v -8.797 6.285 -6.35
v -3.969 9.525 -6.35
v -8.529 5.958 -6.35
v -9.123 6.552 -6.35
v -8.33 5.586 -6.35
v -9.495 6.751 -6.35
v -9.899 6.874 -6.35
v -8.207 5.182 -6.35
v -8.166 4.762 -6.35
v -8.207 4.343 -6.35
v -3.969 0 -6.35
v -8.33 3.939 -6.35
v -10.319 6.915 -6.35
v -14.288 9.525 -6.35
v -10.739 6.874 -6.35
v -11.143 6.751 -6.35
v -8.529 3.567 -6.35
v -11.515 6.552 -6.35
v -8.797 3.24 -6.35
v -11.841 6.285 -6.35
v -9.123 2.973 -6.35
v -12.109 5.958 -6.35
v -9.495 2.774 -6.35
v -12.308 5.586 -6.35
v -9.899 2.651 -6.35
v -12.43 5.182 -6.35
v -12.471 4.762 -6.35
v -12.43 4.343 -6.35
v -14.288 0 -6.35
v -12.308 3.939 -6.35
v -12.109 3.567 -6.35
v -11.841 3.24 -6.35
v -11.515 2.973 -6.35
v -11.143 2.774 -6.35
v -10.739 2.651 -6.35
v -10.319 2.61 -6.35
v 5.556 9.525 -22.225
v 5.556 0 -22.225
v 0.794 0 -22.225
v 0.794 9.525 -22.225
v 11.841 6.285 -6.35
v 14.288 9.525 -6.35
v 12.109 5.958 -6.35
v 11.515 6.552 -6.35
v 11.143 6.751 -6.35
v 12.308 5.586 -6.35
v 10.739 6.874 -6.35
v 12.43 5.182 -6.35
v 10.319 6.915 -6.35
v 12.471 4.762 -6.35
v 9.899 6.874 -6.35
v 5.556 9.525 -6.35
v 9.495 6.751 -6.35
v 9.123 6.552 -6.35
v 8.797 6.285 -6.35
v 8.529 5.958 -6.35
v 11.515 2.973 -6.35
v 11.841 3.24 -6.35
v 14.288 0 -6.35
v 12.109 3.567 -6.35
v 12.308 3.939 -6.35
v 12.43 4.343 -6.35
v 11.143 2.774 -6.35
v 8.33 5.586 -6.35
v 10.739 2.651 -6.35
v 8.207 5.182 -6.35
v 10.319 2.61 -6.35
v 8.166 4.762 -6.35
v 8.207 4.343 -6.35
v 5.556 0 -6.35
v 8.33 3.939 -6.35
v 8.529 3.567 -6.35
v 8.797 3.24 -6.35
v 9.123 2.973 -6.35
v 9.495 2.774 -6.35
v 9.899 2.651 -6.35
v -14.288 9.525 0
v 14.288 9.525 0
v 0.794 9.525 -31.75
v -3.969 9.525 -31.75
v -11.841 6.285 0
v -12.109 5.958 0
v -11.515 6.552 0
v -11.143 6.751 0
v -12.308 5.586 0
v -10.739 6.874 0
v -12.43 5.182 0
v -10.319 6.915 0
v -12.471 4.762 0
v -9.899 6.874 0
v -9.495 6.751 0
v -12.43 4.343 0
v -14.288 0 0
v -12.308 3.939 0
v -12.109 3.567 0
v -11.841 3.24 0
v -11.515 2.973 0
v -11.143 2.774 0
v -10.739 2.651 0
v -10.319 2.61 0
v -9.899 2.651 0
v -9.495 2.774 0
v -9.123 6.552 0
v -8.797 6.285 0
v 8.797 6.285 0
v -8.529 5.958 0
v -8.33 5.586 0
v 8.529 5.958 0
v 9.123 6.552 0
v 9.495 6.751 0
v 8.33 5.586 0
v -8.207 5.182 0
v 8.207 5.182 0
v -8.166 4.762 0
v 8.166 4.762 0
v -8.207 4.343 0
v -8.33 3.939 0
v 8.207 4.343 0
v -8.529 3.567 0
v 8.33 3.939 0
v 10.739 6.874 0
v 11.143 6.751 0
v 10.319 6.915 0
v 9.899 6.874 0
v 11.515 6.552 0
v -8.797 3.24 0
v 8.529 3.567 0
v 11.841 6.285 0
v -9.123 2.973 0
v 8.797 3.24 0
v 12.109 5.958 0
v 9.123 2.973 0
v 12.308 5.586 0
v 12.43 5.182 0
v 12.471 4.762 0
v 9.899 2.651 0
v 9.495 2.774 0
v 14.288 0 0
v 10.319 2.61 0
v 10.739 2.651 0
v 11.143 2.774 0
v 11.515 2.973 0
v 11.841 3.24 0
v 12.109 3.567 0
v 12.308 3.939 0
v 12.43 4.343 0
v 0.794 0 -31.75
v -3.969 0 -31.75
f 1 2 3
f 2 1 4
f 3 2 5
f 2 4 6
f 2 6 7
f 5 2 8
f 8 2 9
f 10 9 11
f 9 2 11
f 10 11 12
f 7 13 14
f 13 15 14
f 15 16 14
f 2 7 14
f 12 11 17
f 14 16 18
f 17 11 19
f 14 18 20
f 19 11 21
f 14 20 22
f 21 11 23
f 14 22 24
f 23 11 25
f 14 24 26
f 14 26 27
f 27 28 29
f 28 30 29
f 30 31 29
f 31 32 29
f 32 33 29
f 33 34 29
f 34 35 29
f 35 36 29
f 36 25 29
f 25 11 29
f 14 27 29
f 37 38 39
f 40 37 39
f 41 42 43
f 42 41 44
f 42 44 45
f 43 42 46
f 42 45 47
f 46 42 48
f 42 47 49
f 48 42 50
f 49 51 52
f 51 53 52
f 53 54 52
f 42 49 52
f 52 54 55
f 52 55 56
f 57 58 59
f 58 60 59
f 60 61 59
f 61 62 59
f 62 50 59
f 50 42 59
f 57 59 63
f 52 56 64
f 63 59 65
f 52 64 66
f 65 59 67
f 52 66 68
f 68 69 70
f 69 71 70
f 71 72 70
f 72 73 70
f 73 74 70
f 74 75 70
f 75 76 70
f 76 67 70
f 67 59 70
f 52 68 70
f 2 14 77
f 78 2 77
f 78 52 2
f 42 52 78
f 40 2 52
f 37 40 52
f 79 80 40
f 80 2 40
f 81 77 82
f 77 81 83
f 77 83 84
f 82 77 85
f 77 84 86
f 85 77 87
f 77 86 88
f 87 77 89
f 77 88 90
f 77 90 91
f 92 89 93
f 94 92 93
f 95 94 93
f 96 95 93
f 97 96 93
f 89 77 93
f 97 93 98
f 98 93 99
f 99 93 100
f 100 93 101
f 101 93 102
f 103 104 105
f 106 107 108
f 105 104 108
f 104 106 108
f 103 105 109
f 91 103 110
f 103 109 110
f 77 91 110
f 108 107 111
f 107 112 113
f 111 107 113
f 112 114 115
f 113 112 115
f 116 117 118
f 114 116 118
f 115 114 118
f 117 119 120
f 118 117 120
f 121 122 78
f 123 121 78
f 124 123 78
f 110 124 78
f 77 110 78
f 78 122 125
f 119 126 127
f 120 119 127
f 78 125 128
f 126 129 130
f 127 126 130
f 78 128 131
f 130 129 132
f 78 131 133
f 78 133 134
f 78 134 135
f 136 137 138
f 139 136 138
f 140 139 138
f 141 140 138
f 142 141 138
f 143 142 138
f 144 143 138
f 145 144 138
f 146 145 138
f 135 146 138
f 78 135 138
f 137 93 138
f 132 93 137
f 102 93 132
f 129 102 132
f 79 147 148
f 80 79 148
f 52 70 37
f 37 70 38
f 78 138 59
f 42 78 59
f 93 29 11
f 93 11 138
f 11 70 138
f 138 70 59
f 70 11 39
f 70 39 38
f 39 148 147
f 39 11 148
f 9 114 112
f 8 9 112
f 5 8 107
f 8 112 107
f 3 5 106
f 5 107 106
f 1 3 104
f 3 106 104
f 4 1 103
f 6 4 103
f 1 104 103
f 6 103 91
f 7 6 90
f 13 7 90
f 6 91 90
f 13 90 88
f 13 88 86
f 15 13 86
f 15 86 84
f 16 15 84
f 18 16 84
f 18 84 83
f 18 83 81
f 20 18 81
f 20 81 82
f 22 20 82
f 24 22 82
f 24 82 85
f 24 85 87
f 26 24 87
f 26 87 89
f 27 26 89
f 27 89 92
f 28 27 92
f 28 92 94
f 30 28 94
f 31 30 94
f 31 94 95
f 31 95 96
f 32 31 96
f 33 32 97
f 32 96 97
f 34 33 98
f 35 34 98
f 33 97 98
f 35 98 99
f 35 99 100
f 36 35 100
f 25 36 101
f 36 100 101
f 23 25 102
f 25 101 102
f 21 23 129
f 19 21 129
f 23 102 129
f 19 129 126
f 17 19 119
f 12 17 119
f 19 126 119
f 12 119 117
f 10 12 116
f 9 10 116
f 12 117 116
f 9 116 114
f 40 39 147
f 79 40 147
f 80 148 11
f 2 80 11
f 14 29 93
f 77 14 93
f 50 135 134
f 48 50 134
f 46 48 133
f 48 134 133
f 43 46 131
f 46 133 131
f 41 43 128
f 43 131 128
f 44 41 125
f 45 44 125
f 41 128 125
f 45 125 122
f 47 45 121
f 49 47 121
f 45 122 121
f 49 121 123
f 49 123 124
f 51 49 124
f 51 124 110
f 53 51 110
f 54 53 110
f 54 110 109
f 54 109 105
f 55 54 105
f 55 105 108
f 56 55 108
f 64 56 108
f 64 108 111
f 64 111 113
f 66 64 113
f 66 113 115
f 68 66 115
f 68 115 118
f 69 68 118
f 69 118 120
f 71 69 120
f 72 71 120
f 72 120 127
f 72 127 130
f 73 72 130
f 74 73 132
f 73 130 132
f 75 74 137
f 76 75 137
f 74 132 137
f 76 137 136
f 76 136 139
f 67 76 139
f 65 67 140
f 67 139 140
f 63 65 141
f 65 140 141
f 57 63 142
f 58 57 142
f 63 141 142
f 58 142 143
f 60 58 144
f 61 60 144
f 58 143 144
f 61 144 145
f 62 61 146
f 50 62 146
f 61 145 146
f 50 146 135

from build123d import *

# Parameters (mm, degrees)
BOSS_EXTRUDE1_DEPTH = 9.525
SKETCH3_R           = 2.15265
CUT_EXTRUDE1_DEPTH  = 37.095993978


with BuildPart() as part:
    # Sketch2 → Boss-Extrude1 (new body)
    with BuildSketch(Plane(origin=(0, 0, 0), x_dir=(1, 0, 0), z_dir=(0, 1, 0))):
        Polygon((-14.2875, 0), (14.2875, 0), (14.2875, 6.35), (5.55625, 6.35), (5.55625, 22.225), (0.79375, 22.225), (0.79375, 31.75), (-3.96875, 31.75), (-3.96875, 6.35), (-14.2875, 6.35), align=None)
    extrude(amount=BOSS_EXTRUDE1_DEPTH)

    # Sketch3 → Cut-Extrude1 (cut, through all)
    with BuildSketch(Plane.XY):
        with Locations((-10.31875, 4.7625)):
            Circle(SKETCH3_R)
        with Locations((10.31875, 4.7625)):
            Circle(SKETCH3_R)
    extrude(amount=-CUT_EXTRUDE1_DEPTH, mode=Mode.SUBTRACT)


solid = part.part
